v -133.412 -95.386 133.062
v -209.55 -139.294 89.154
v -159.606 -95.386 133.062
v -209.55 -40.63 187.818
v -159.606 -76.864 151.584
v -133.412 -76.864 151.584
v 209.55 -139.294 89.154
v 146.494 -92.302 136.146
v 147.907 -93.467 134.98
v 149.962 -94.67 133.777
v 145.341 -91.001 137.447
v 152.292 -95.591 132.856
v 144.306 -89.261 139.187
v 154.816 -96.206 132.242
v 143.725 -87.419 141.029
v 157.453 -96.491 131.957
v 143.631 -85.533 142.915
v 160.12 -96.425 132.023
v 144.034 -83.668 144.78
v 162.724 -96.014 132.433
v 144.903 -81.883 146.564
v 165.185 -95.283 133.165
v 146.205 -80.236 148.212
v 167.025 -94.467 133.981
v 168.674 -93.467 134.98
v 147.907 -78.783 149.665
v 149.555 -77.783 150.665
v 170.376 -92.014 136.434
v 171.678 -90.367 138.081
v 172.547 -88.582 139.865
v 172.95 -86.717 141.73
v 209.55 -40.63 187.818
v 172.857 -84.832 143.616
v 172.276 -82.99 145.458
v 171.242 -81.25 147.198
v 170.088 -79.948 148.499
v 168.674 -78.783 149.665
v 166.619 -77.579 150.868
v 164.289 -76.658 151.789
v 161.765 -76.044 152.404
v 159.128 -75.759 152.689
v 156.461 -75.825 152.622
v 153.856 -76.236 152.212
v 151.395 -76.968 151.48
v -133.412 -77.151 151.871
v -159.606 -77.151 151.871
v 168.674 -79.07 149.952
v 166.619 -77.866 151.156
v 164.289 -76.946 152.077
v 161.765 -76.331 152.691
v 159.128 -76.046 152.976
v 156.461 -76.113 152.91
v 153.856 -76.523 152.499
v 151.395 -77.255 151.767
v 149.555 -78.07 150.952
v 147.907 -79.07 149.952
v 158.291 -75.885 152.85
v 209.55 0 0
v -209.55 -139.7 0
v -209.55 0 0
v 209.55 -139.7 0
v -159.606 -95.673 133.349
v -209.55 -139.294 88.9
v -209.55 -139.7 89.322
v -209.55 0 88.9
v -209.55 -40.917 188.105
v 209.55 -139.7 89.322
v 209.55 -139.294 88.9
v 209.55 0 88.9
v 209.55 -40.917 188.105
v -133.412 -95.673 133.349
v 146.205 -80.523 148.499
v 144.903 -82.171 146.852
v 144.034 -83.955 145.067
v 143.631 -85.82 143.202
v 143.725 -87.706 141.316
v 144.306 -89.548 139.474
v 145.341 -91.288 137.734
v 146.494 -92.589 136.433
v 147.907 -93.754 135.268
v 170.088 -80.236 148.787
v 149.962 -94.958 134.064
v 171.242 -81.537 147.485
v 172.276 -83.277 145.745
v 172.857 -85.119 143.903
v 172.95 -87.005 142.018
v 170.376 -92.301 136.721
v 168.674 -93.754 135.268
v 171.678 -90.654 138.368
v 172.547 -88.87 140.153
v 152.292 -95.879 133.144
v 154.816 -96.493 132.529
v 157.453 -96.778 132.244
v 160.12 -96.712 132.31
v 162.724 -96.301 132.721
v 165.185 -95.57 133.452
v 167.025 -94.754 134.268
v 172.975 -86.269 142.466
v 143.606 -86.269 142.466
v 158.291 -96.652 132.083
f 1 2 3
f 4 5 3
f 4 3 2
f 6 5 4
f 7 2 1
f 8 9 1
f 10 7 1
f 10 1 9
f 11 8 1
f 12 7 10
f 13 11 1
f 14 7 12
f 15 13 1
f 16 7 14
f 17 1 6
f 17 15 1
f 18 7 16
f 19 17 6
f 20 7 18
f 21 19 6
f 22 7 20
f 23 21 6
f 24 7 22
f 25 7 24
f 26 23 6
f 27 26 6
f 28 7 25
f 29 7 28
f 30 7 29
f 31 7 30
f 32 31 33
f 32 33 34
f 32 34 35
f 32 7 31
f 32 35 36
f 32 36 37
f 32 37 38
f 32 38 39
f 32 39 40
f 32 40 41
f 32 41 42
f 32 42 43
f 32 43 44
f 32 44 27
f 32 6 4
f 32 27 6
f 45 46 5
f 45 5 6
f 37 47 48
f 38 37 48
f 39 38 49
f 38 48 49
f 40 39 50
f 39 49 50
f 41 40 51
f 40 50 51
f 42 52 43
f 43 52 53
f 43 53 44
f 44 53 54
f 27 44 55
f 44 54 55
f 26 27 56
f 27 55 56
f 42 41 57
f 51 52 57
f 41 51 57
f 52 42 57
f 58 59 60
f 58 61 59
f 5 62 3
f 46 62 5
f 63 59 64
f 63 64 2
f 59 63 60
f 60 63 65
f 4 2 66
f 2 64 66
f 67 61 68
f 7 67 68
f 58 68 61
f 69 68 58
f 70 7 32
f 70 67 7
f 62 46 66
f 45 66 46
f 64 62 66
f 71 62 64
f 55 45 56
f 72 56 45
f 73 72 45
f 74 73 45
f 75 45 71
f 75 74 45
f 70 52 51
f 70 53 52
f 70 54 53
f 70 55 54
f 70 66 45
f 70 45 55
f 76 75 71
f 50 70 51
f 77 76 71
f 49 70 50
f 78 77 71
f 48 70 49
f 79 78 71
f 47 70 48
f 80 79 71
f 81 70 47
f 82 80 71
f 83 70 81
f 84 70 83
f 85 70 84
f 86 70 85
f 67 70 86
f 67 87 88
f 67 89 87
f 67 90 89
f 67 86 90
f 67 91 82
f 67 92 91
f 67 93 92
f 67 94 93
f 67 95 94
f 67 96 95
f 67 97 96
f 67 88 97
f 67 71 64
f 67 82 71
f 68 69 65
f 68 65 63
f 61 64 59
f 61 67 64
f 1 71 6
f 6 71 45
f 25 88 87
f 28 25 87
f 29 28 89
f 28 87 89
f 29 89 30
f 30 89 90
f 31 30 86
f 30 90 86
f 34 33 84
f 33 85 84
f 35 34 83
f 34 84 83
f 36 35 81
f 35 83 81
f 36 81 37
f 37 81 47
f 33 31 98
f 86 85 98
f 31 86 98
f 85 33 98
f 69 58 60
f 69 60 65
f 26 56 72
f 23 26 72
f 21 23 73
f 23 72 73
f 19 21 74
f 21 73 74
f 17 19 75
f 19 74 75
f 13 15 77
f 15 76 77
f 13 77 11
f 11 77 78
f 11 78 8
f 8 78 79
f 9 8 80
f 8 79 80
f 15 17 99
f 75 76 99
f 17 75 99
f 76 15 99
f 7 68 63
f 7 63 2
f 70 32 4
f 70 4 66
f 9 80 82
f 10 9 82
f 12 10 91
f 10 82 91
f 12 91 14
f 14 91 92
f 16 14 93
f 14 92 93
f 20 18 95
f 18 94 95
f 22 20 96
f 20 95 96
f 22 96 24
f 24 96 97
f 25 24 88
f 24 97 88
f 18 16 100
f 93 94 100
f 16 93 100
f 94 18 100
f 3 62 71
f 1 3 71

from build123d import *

# Parameters (mm, degrees)
F1_DEPTH = 209.55
F2_W     = 26.19375
F2_H     = 26.19375
F3_DEPTH = 0.4064


# Not quite as in the source:
# - the dataset's text gives a spline's control points without its knots; the knots are read off the source's solid


with BuildPart() as f1:
    # F0 (on Right) → F1 (new body, symmetric)
    with BuildSketch(Plane.YZ):
        Polygon((-139.7, 0), (0, 0), (0, 88.9), (-139.2936, 88.9), (-139.2936, 89.154), (-40.6298144724, 187.8177855276), (-40.9171826682, 188.1051537235), (-139.7, 89.3223363917), align=None)
    extrude(amount=F1_DEPTH, both=True)

    # F2 (on face) → F3 (cut, through all)
    with BuildSketch(Plane(origin=(0, -114.5111681959, 114.5111681959), x_dir=(1, 0, 0), z_dir=(0, -0.7071067812, 0.7071067812))):
        with Locations((-146.5093133926, 39.7379171954)):
            Rectangle(F2_W, F2_H)
        with BuildLine():
            add(Edge.make_bspline(
                [(168.6742066074, 50.1214371954), (165.9556700074, 52.8397705954), (162.1350528074, 54.4222921954), (158.2906866074, 54.4222921954)],
                knots=[7, 7, 7, 7, 8, 8, 8, 8], degree=3))
            add(Edge.make_bspline(
                [(158.2906866074, 54.4222921954), (154.4462950074, 54.4222921954), (150.6256778074, 52.8397705954), (147.9074968074, 50.1214371954)],
                knots=[0, 0, 0, 0, 1, 1, 1, 1], degree=3))
            add(Edge.make_bspline(
                [(147.9074968074, 50.1214371954), (145.1889856074, 47.4029005954), (143.6063116074, 43.5822833954), (143.6063116074, 39.7379171954), (143.6063116074, 35.8935255954), (145.1889856074, 32.0729083954), (147.9074968074, 29.3543971954)],
                knots=[1, 1, 1, 1, 2, 2, 2, 3, 3, 3, 3], degree=3))
            add(Edge.make_bspline(
                [(147.9074968074, 29.3543971954), (150.6256778074, 26.6360383954), (154.4462950074, 25.0535421954), (158.2906866074, 25.0535421954), (162.1350528074, 25.0535421954), (165.9556700074, 26.6360383954), (168.6742066074, 29.3543971954)],
                knots=[3, 3, 3, 3, 4, 4, 4, 5, 5, 5, 5], degree=3))
            add(Edge.make_bspline(
                [(168.6742066074, 29.3543971954), (171.3927178074, 32.0729083954), (172.9750616074, 35.8935255954), (172.9750616074, 39.7379171954), (172.9750616074, 43.5822833954), (171.3927178074, 47.4029005954), (168.6742066074, 50.1214371954)],
                knots=[5, 5, 5, 5, 6, 6, 6, 7, 7, 7, 7], degree=3))
        make_face()
    extrude(amount=-F3_DEPTH, mode=Mode.SUBTRACT)


solid = f1.part
